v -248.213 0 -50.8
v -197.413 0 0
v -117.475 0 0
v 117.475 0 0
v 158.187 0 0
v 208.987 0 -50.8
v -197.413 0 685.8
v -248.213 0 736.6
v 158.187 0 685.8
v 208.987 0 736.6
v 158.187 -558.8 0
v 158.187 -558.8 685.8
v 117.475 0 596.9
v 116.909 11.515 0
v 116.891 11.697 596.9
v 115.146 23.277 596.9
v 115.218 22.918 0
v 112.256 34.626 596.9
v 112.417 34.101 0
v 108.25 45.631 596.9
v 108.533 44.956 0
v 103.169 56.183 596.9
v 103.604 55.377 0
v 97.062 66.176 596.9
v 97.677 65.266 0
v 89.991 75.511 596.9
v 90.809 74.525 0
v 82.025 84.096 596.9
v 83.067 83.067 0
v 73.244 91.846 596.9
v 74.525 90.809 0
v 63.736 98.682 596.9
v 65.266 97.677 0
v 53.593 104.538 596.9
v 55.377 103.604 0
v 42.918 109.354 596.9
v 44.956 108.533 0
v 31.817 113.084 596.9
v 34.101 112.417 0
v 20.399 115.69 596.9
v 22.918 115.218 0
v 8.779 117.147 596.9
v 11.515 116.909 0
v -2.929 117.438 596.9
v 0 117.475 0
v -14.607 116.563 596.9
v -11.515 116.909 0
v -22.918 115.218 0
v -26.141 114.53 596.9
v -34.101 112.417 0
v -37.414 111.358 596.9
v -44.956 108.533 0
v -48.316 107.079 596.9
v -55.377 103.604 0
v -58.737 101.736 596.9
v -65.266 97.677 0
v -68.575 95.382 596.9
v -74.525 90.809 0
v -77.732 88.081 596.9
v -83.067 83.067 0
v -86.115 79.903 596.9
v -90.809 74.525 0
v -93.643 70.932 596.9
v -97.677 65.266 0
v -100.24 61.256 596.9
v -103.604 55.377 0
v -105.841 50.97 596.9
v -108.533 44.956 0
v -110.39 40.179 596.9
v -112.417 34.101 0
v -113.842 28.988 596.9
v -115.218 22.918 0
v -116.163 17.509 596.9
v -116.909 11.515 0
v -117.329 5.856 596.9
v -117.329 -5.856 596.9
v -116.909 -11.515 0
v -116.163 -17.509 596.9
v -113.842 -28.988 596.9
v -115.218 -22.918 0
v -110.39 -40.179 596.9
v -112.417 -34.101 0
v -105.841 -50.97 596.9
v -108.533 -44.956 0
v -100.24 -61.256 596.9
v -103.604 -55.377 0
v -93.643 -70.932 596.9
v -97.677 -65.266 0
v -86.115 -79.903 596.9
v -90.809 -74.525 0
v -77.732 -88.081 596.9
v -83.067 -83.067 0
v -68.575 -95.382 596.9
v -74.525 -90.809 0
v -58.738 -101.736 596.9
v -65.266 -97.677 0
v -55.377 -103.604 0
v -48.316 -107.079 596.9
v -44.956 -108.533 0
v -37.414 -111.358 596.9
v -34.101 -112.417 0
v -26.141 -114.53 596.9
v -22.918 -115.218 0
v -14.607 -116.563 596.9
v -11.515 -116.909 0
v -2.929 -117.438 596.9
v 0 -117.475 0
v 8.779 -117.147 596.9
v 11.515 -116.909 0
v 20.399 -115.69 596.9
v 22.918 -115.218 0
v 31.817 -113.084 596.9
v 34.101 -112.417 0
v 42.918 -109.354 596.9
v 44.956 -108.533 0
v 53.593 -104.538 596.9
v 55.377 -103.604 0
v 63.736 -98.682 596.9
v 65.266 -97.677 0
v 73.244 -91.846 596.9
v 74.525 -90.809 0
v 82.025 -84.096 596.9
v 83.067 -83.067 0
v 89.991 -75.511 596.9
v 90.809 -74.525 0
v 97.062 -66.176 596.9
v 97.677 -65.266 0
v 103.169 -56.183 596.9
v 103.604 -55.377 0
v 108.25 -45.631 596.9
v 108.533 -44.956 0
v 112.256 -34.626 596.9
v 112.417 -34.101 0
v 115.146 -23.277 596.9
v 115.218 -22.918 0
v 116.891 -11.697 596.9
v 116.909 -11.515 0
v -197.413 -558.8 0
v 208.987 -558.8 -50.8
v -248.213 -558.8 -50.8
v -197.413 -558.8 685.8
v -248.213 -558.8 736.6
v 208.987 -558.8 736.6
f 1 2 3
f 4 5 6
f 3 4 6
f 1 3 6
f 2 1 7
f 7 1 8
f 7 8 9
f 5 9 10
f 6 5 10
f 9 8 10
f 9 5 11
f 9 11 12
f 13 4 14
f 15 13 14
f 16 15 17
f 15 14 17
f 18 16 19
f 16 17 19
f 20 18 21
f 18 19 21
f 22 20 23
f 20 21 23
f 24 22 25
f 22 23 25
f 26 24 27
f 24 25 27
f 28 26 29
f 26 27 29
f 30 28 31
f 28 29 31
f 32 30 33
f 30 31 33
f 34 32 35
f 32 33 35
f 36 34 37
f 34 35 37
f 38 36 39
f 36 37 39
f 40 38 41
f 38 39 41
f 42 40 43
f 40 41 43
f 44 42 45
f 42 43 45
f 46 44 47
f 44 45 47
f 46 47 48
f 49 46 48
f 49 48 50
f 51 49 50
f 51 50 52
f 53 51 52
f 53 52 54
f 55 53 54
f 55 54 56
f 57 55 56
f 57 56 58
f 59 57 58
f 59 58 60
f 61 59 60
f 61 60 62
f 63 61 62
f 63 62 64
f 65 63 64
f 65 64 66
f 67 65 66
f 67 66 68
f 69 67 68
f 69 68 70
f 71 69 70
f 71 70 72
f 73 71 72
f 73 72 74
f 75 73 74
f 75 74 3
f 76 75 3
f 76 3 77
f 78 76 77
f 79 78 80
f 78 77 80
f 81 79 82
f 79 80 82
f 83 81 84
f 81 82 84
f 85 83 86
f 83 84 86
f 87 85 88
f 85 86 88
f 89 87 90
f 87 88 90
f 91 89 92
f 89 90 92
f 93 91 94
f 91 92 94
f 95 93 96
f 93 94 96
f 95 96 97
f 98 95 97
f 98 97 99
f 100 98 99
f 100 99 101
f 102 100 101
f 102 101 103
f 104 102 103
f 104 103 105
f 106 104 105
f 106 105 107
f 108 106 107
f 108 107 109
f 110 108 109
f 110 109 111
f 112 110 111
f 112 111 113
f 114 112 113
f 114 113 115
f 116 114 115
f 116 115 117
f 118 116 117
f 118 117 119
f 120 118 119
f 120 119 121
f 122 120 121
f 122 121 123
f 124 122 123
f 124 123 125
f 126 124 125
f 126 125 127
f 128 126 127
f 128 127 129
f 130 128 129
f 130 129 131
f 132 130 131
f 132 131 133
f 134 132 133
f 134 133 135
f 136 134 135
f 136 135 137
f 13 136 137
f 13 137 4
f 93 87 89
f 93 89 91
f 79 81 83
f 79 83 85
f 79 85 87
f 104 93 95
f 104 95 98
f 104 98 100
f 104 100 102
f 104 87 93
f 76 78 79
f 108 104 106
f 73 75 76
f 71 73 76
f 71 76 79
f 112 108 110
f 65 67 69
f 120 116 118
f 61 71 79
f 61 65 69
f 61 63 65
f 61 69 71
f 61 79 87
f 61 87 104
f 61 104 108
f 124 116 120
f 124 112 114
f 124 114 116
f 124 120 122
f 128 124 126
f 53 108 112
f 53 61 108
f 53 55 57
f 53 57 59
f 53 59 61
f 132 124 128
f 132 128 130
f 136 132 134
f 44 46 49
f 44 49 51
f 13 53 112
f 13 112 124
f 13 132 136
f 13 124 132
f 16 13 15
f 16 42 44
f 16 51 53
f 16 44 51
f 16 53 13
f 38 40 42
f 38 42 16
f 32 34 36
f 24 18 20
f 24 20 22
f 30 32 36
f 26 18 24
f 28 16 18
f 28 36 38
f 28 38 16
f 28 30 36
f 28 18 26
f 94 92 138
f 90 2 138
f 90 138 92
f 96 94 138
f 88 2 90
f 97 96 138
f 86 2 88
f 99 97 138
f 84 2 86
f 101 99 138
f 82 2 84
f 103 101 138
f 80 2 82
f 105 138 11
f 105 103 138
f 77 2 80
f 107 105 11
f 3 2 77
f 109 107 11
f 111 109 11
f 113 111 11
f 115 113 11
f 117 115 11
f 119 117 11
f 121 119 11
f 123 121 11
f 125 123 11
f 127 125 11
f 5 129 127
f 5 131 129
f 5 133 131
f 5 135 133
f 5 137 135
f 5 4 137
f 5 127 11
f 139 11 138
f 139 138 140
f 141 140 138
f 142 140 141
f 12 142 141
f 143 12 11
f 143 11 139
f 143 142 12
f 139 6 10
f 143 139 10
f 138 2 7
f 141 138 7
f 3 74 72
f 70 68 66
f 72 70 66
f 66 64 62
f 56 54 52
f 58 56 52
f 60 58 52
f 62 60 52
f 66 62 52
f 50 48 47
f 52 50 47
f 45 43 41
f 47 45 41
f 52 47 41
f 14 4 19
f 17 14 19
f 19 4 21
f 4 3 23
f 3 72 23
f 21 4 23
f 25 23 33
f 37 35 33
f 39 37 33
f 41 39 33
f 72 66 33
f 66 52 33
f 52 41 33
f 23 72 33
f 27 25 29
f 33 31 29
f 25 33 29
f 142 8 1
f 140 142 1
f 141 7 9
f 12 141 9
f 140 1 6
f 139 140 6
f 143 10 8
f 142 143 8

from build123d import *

# Parameters (mm, degrees)
F0_R     = 117.475
F1_DEPTH = 596.9
F2_W     = 355.6
F2_H     = 685.8
F3_DEPTH = 558.8


with BuildPart() as f1:
    # F0 (on Top) → F1 (new body)
    with BuildSketch(Plane.XY):
        Circle(F0_R)
    extrude(amount=F1_DEPTH)

    # F2 (on Front) → F3 (join)
    with BuildSketch(Plane.XZ):
        Polygon((208.986691, -50.8), (208.986691, 0), (208.986691, 736.6), (-248.213309, 736.6), (-248.213309, -50.8), align=None)
        with Locations((-19.613309, 342.9)):
            Rectangle(F2_W, F2_H, mode=Mode.SUBTRACT)
    extrude(amount=F3_DEPTH)


solid = f1.part
